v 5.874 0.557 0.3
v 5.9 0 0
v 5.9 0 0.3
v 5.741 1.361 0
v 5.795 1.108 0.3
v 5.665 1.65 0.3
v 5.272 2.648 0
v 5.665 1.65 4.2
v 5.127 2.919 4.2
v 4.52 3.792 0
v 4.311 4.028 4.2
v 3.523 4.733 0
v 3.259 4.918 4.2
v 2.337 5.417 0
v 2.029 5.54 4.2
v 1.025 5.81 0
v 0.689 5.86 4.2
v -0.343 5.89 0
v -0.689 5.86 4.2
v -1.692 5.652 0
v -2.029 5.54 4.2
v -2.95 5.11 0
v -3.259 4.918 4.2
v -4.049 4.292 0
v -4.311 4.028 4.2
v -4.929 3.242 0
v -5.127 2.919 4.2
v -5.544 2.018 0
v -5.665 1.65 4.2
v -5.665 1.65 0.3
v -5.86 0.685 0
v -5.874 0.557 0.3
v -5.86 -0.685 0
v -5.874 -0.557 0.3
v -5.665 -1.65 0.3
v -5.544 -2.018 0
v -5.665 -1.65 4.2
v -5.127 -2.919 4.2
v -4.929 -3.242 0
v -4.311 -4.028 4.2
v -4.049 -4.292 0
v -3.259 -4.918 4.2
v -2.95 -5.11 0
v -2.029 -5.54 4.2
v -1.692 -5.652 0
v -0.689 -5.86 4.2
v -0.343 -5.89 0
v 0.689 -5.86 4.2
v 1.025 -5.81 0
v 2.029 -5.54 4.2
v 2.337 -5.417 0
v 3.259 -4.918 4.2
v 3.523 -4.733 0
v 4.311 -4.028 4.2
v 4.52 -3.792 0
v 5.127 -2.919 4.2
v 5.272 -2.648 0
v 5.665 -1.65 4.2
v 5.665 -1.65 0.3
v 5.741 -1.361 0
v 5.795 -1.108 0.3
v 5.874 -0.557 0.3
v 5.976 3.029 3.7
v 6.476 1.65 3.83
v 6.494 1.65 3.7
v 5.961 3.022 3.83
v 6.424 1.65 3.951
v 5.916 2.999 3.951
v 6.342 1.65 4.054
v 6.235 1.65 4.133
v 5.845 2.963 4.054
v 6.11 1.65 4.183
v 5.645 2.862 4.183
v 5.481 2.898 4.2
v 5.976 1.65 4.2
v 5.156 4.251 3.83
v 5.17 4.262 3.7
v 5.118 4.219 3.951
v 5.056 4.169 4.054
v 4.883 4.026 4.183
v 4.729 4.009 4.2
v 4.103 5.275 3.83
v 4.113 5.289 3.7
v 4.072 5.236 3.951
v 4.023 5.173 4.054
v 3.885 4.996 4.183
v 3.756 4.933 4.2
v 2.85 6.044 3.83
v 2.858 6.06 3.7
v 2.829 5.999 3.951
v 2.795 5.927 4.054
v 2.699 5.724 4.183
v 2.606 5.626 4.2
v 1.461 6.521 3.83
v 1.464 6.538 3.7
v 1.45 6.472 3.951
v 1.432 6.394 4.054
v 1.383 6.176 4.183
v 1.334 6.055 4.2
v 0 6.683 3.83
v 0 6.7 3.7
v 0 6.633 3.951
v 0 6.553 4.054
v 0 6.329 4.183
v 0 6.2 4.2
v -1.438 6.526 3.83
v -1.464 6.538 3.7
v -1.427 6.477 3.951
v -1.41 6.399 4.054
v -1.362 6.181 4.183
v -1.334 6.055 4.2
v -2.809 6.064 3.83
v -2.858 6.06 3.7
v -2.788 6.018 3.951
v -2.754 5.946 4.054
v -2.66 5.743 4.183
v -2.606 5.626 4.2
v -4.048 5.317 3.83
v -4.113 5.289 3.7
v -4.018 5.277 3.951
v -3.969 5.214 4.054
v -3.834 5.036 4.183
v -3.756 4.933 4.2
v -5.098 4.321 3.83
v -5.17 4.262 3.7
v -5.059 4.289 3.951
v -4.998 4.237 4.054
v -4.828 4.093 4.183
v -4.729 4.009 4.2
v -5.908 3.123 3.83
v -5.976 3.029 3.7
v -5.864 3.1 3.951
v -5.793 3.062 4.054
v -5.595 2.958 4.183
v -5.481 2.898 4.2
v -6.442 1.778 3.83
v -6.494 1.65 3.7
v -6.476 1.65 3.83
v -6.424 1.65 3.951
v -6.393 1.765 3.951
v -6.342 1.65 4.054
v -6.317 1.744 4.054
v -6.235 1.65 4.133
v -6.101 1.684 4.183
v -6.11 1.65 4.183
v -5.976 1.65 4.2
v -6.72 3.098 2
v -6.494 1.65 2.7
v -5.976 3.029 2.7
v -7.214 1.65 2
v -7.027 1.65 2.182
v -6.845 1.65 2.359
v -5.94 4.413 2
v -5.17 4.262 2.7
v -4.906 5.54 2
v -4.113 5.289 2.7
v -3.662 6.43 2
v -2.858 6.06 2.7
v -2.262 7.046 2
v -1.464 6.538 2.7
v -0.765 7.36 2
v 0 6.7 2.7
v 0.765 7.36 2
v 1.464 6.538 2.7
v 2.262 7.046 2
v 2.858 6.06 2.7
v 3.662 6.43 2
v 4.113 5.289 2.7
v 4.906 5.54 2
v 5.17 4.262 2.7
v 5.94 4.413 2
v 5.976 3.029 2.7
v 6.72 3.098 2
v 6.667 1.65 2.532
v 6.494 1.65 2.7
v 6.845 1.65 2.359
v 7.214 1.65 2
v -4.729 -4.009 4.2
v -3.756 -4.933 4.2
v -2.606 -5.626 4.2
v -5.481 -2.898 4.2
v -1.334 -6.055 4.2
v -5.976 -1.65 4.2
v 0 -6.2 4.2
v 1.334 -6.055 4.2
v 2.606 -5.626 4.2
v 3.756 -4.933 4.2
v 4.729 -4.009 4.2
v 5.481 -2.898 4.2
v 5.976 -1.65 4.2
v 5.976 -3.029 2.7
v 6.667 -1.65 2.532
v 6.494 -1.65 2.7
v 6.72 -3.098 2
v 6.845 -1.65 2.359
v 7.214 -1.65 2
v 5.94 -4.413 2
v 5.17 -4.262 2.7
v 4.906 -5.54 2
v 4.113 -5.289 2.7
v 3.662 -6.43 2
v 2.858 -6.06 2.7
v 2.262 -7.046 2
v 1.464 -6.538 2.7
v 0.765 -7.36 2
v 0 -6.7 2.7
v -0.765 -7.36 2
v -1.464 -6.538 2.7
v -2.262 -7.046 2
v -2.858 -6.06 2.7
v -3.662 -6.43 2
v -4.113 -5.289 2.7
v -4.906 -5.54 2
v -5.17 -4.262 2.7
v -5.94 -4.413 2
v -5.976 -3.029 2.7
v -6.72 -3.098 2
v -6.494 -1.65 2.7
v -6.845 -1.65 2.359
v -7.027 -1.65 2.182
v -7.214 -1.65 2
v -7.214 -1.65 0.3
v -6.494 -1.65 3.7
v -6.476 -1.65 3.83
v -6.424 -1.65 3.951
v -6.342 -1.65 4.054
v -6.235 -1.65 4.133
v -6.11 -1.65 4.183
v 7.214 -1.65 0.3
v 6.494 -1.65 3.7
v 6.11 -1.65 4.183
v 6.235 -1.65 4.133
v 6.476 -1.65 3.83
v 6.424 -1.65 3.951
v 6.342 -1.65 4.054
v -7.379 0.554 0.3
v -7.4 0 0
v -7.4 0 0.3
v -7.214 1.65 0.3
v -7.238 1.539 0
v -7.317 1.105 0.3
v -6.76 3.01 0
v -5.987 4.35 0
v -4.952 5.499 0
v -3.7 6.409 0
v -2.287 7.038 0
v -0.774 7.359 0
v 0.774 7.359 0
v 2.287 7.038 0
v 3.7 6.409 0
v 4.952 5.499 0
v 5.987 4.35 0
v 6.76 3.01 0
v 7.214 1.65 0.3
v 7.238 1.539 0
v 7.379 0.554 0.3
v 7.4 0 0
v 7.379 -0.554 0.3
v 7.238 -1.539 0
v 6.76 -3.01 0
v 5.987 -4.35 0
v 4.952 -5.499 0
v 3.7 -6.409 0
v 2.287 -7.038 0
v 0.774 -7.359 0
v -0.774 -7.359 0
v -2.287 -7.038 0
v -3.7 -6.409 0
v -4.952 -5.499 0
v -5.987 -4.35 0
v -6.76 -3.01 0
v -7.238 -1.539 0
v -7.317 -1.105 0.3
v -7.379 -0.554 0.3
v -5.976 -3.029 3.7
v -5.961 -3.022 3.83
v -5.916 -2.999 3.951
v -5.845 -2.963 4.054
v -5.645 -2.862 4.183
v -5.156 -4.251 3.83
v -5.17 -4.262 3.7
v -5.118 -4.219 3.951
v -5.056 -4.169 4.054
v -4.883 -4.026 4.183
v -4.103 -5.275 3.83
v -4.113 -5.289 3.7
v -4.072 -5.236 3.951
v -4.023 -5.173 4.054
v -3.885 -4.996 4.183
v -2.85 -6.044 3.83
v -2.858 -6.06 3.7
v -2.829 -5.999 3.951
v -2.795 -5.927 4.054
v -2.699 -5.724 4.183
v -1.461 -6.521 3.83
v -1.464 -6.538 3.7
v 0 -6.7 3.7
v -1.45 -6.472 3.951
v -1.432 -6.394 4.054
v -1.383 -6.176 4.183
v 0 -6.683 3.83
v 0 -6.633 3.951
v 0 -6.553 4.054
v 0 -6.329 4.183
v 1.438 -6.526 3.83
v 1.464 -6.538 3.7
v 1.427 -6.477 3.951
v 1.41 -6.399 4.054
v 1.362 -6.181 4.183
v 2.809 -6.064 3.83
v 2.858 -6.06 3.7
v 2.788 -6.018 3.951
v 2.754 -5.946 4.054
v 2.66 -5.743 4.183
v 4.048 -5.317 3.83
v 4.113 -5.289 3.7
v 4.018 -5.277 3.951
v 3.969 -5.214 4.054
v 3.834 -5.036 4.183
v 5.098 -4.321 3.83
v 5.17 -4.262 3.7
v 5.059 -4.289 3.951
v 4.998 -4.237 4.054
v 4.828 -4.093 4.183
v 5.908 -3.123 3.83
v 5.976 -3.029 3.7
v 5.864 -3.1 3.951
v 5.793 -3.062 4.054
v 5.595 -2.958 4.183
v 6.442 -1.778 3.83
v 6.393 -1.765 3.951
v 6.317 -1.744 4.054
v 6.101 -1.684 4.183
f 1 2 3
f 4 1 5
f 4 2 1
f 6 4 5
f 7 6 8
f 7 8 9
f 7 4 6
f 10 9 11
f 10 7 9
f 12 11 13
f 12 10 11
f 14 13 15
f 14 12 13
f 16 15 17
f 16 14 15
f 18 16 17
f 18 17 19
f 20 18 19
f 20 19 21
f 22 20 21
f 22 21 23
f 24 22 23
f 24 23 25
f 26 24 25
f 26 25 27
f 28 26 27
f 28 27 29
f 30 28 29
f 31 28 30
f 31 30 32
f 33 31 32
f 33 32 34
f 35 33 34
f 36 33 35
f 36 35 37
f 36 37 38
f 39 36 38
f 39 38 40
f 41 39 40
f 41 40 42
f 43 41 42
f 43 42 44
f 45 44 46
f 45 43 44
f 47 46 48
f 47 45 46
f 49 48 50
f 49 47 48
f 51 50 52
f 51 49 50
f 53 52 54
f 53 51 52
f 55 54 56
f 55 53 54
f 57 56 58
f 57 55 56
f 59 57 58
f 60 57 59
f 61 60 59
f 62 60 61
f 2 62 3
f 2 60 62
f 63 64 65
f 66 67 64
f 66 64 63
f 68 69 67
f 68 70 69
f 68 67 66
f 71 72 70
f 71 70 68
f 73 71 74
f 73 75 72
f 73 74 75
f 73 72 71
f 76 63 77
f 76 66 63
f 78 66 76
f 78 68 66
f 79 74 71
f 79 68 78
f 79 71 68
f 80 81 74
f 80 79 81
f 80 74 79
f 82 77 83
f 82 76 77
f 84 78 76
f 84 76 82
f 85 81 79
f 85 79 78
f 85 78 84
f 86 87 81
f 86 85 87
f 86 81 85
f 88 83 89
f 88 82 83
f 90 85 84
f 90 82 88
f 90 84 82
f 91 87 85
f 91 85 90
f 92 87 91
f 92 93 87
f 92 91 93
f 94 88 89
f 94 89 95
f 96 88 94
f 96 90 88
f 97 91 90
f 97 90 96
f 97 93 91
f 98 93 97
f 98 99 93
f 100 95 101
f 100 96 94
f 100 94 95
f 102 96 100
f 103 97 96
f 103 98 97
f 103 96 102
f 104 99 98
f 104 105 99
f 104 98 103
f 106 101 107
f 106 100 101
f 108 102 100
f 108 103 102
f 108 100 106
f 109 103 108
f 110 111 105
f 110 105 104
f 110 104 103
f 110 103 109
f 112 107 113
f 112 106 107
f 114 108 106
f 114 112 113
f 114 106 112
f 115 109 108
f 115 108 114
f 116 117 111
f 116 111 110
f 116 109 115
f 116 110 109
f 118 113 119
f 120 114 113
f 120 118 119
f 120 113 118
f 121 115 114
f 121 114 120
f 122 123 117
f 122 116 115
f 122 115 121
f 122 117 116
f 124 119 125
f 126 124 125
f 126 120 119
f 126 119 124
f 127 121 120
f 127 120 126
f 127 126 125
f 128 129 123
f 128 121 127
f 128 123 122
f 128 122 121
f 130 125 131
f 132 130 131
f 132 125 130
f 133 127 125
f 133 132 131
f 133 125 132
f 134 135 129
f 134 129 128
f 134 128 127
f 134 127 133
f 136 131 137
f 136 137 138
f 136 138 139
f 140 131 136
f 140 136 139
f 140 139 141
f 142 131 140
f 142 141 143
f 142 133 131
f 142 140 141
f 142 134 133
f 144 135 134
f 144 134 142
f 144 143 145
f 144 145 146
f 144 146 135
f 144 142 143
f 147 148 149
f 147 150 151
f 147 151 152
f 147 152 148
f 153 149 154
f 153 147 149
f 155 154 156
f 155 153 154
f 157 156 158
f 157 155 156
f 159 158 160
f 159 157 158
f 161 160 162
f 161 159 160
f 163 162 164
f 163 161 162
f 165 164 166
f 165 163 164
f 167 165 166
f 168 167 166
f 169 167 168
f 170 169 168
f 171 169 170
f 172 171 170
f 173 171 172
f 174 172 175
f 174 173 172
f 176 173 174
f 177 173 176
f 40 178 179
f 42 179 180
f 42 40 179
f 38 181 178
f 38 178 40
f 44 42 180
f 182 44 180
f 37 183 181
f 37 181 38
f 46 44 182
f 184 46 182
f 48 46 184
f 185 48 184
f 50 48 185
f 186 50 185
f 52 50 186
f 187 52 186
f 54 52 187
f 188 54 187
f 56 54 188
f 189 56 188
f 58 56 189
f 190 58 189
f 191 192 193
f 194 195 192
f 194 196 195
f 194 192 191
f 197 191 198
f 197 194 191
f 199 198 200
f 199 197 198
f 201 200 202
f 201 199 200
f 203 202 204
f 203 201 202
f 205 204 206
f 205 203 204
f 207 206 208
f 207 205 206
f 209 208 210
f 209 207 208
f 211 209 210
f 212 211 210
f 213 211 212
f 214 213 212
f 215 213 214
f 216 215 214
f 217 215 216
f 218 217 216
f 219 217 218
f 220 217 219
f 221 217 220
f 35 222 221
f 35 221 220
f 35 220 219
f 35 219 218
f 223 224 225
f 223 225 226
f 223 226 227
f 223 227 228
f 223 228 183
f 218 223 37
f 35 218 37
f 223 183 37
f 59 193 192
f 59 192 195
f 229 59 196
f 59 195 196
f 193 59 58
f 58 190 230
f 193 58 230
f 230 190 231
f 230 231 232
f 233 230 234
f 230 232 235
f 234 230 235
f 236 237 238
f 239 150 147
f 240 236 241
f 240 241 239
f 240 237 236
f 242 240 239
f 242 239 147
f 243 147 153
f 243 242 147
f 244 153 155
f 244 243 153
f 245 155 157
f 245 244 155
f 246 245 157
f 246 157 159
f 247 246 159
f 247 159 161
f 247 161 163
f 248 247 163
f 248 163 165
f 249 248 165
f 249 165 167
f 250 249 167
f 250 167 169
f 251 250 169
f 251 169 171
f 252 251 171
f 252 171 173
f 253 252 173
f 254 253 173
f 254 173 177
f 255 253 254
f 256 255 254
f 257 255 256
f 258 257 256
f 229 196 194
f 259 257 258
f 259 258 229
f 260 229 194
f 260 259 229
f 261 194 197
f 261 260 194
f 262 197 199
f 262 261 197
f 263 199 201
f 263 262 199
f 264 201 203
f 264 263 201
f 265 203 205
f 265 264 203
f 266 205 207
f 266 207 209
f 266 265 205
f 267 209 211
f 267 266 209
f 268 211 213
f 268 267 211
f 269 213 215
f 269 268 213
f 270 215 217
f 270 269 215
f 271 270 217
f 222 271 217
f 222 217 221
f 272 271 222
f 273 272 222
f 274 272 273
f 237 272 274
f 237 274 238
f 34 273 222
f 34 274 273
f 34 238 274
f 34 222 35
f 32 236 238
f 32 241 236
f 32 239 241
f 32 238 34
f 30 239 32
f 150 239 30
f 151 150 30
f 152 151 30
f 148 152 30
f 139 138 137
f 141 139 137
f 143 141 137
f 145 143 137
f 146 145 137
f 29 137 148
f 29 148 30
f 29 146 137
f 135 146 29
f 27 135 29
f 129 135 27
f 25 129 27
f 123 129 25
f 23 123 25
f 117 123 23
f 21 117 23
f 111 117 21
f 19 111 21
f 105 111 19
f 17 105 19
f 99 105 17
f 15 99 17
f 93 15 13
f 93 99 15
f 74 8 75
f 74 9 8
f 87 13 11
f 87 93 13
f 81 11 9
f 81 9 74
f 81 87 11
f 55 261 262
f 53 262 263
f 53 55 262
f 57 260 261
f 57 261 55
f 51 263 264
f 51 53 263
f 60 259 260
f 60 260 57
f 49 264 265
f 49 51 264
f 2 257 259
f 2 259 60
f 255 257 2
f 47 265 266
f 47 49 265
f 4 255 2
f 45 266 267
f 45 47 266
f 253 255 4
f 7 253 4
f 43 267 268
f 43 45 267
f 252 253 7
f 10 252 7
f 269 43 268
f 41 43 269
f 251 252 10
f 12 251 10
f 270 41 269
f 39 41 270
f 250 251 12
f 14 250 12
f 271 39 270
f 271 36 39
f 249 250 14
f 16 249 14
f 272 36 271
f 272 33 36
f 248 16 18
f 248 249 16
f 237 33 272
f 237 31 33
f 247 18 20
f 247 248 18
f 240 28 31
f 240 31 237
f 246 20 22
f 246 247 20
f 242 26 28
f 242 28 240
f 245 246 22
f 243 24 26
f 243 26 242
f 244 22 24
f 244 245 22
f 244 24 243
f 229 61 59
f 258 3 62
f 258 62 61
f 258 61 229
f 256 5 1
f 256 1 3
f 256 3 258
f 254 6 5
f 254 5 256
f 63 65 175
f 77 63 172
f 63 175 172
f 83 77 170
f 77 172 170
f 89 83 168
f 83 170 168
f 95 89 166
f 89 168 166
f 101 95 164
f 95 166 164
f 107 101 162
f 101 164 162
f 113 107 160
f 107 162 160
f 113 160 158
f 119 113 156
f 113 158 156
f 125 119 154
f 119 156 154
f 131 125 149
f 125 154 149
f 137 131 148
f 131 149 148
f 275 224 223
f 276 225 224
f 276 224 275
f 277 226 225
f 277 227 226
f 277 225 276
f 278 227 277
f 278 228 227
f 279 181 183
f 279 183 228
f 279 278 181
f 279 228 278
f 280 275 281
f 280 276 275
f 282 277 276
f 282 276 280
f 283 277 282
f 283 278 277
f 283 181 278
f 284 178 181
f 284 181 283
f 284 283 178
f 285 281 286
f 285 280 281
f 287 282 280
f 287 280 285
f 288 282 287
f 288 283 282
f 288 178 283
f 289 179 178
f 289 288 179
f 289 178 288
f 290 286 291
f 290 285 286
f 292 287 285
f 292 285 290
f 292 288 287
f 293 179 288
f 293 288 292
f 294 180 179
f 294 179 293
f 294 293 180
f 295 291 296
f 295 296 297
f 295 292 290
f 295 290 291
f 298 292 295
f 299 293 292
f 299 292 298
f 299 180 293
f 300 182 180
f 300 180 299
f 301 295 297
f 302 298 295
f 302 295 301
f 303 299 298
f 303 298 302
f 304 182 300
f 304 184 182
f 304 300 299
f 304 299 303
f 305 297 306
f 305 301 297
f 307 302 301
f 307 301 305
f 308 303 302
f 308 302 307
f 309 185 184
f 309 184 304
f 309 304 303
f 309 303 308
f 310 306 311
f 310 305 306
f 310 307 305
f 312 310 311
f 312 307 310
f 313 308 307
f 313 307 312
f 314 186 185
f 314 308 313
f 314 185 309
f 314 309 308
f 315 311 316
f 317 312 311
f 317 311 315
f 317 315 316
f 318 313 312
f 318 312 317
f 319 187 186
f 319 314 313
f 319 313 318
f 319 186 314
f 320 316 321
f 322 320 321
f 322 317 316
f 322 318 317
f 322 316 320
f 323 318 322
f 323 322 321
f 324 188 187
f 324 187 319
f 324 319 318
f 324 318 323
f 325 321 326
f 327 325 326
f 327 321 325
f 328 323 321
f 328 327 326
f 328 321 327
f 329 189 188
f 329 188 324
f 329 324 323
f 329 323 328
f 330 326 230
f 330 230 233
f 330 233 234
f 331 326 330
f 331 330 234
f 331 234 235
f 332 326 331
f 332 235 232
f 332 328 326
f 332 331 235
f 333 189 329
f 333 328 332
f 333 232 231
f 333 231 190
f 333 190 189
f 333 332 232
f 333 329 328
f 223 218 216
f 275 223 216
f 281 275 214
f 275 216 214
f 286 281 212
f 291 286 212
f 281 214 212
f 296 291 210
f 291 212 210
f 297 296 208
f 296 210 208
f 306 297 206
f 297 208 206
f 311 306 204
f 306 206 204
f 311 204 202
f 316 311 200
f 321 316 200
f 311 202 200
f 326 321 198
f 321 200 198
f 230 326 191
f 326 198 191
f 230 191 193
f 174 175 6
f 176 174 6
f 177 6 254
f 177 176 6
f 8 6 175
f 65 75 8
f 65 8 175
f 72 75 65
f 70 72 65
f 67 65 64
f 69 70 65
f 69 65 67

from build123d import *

# Parameters (mm, degrees)
CROQUIS1_R              = 6.7
CROQUIS1_R_2            = 5.9
SALIENTE_EXTRUIR1_DEPTH = 4.2
CROQUIS3_R              = 7.4
CROQUIS3_R_2            = 5.9
SALIENTE_EXTRUIR2_DEPTH = 2
REDONDEO1_R             = 0.5
CHAFL_N1_SIZE           = 0.7
CROQUIS2_W              = 20.515822
CROQUIS2_H              = 3.3
CORTAR_EXTRUIR1_DEPTH   = 3.9


with BuildPart() as part:
    # Croquis1 → Saliente-Extruir1 (new body)
    with BuildSketch(Plane.XY):
        Circle(CROQUIS1_R)
        Circle(CROQUIS1_R_2, mode=Mode.SUBTRACT)
    extrude(amount=SALIENTE_EXTRUIR1_DEPTH)

    # Croquis3 → Saliente-Extruir2 (add)
    with BuildSketch(Plane(origin=(0, 0, 0), x_dir=(-1, 0, 0), z_dir=(0, 0, -1))):
        Circle(CROQUIS3_R)
        with Locations(Location((0, 0, 0), (0, 0, 180))):
            Circle(CROQUIS3_R_2, mode=Mode.SUBTRACT)
    extrude(amount=-SALIENTE_EXTRUIR2_DEPTH)

    # Redondeo1
    redondeo1_edges = [part.edges().sort_by_distance(p)[0] for p in [
        (-6.7, 0, 4.2),
    ]]
    fillet(redondeo1_edges, radius=REDONDEO1_R)

    # Chaflán1
    chafl_n1_edges = [part.edges().sort_by_distance(p)[0] for p in [
        (-6.7, 0, 2),
    ]]
    chamfer(chafl_n1_edges, length=CHAFL_N1_SIZE - 0.0001)  # a hair under: the kernel refuses the full size

    # Croquis2 → Cortar-Extruir1 (cut)
    with BuildSketch(Plane.XY.offset(4.2)):
        Rectangle(CROQUIS2_W, CROQUIS2_H)
    extrude(amount=-CORTAR_EXTRUIR1_DEPTH, mode=Mode.SUBTRACT)


solid = part.part
